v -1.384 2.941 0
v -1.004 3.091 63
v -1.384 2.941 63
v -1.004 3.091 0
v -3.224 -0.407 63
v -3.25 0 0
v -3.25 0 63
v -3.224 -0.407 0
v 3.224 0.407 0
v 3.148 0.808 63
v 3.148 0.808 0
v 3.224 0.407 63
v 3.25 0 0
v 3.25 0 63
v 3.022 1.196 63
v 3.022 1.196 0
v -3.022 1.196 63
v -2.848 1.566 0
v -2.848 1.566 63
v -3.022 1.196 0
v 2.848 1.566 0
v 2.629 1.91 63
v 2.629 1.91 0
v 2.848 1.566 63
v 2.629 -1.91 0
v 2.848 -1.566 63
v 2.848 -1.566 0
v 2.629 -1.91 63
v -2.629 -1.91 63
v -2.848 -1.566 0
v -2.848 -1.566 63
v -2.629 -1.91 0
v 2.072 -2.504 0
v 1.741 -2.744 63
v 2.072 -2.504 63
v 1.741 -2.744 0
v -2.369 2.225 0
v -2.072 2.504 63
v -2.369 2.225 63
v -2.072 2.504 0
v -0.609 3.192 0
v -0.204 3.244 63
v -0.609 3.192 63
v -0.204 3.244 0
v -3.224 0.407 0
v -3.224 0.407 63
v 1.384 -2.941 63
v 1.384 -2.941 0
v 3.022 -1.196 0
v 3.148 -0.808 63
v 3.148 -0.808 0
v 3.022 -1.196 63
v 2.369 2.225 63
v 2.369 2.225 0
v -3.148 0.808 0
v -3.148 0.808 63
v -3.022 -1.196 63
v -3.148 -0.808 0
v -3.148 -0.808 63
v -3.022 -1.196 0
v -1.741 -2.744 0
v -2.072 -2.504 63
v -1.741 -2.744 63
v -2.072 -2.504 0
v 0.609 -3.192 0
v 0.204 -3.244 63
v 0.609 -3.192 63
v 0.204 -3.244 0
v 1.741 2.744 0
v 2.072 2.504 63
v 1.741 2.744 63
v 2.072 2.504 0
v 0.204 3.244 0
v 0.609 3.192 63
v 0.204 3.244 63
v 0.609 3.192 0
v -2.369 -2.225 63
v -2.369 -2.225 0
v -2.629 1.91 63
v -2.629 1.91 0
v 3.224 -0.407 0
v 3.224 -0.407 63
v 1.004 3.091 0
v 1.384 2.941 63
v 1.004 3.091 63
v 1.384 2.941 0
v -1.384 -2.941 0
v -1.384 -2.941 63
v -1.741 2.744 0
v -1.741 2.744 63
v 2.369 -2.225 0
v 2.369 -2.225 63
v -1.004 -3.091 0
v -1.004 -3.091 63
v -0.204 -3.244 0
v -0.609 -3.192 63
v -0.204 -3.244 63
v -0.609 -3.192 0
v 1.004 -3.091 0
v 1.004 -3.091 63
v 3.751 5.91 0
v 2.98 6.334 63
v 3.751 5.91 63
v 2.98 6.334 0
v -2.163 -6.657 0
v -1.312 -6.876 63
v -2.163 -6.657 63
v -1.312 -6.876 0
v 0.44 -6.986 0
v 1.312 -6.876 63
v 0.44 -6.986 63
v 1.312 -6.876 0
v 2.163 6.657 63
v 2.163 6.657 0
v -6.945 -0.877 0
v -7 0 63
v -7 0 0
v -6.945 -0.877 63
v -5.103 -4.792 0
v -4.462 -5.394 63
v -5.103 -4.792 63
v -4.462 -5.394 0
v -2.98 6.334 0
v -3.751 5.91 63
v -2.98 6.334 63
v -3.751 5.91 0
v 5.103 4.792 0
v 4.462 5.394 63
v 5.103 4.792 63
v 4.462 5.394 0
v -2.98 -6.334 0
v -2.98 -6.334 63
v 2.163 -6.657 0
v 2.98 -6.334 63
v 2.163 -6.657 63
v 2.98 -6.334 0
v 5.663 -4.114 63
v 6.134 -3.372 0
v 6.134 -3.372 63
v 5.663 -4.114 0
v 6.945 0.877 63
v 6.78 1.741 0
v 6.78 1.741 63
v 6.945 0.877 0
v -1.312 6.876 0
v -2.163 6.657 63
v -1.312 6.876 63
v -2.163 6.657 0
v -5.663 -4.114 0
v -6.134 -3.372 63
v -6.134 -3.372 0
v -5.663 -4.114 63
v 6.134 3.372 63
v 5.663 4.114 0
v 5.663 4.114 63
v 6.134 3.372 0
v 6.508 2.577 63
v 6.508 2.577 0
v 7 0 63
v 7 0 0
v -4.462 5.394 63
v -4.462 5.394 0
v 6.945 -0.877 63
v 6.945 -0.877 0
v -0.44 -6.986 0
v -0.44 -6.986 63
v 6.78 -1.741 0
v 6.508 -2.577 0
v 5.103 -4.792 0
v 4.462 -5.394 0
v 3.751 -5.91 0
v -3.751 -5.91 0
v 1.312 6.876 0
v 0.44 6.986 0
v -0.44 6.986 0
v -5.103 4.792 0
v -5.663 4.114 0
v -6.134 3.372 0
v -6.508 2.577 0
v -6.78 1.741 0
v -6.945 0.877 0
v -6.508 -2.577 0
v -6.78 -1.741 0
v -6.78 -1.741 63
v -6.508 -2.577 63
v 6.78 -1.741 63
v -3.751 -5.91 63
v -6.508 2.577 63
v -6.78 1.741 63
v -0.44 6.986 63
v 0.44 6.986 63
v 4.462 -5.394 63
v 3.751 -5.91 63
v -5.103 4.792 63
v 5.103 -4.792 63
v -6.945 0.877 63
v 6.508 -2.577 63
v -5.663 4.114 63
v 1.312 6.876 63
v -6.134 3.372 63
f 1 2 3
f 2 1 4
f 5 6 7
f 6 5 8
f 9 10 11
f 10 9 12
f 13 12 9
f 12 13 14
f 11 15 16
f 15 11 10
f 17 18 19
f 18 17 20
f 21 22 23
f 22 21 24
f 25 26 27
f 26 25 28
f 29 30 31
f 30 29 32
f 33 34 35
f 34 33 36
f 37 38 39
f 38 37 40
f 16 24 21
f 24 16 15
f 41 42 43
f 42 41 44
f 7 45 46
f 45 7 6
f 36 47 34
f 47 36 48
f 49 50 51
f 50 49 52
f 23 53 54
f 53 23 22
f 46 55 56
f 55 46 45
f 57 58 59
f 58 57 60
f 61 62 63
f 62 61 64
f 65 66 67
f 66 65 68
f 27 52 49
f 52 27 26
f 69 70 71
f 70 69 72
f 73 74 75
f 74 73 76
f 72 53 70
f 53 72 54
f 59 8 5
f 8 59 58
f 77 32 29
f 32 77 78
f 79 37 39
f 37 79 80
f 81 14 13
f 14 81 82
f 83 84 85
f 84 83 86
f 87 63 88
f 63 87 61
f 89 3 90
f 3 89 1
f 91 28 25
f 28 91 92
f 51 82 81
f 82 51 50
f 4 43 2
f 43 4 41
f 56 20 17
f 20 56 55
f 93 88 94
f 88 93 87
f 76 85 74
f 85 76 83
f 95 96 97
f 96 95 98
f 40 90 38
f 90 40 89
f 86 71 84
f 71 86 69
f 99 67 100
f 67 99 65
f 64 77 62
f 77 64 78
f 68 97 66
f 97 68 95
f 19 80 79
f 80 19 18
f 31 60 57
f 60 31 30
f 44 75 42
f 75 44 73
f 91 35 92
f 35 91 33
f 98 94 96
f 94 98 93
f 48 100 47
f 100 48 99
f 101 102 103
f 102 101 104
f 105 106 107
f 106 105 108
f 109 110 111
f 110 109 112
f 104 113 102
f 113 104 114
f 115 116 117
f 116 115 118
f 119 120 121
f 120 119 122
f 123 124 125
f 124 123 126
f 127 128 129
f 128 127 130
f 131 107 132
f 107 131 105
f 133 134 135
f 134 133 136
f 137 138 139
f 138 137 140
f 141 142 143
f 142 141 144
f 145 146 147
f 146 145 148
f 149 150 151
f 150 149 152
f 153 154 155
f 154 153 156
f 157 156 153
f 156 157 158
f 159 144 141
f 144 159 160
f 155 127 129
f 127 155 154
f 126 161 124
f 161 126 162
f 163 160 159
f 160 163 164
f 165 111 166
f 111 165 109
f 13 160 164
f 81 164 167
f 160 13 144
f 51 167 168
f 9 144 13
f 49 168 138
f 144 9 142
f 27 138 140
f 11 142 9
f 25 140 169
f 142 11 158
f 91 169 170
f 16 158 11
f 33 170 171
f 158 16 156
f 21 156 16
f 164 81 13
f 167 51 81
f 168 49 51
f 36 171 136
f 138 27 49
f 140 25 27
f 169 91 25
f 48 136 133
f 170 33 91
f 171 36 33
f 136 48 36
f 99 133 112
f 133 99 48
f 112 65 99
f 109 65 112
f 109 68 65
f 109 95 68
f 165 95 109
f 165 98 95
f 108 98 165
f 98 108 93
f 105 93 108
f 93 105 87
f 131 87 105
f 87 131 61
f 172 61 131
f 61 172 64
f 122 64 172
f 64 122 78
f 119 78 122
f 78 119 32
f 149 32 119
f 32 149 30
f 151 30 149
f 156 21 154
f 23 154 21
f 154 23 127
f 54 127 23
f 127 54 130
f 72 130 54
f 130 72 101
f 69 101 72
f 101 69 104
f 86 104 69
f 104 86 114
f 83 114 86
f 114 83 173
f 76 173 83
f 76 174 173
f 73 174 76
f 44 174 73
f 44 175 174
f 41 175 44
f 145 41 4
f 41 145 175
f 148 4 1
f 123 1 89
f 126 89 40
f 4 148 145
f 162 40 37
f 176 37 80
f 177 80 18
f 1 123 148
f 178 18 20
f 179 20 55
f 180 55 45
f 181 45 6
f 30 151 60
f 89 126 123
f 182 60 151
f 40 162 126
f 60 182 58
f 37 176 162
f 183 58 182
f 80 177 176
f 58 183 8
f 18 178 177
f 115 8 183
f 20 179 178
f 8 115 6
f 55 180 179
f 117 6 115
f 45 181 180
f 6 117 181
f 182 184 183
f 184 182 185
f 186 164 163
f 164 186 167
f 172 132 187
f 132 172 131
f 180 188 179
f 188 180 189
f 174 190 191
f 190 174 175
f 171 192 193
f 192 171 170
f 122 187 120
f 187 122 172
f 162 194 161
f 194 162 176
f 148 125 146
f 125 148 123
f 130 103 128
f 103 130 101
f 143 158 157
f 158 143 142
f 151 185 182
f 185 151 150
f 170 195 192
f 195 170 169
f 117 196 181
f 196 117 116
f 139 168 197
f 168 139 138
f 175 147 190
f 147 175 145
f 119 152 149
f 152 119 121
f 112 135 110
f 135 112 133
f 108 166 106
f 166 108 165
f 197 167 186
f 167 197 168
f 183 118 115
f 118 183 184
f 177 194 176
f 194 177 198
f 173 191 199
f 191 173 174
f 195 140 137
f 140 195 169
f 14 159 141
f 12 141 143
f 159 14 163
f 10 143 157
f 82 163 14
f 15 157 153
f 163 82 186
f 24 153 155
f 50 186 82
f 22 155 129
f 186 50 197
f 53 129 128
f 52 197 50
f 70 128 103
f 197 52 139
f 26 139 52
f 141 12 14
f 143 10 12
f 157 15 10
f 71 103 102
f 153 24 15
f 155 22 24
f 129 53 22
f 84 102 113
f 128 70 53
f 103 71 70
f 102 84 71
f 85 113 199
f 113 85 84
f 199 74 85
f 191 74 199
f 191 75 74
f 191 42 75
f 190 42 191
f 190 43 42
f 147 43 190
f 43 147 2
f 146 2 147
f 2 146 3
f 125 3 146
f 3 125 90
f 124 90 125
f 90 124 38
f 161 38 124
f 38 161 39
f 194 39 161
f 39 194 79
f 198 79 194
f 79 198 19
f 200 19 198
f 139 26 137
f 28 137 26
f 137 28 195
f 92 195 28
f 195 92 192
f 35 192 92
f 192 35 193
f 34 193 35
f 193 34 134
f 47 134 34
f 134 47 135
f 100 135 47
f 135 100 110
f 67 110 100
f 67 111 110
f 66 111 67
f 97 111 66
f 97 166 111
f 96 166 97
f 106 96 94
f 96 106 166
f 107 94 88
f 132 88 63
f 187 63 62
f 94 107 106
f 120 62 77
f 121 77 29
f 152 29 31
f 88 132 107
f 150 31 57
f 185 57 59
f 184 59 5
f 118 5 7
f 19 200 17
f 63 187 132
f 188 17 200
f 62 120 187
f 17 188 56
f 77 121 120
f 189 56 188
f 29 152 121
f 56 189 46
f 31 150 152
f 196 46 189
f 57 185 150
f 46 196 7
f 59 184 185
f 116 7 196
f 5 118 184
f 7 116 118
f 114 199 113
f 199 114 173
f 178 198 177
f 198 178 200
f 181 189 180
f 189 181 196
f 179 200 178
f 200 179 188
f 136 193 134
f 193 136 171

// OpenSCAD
$fn = 50;


difference() {
	union() {
		*color(alpha = 1.0000000000, c = "gray") {
			translate(v = [0, 7, 0]) {
				linear_extrude(height = 1) {
					text(font = "Arial:style=Bold", halign = "center", size = 4.5000000000, text = "COMMENT plate main", valign = "center");
				}
			}
		}
		cylinder(h = 63, r = 7.0000000000);
	}
	union() {
		*color(alpha = 1.0000000000, c = "gray") {
			translate(v = [0, 7, 0]) {
				linear_extrude(height = 1) {
					text(font = "Arial:style=Bold", halign = "center", size = 4.5000000000, text = "COMMENT holes main", valign = "center");
				}
			}
		}
		translate(v = [0, 0, -100]) {
			cylinder(h = 200, r = 3.2500000000);
		}
		translate(v = [0, 0, -100]) {
			cylinder(h = 200, r = 1.8000000000);
		}
	}
}
